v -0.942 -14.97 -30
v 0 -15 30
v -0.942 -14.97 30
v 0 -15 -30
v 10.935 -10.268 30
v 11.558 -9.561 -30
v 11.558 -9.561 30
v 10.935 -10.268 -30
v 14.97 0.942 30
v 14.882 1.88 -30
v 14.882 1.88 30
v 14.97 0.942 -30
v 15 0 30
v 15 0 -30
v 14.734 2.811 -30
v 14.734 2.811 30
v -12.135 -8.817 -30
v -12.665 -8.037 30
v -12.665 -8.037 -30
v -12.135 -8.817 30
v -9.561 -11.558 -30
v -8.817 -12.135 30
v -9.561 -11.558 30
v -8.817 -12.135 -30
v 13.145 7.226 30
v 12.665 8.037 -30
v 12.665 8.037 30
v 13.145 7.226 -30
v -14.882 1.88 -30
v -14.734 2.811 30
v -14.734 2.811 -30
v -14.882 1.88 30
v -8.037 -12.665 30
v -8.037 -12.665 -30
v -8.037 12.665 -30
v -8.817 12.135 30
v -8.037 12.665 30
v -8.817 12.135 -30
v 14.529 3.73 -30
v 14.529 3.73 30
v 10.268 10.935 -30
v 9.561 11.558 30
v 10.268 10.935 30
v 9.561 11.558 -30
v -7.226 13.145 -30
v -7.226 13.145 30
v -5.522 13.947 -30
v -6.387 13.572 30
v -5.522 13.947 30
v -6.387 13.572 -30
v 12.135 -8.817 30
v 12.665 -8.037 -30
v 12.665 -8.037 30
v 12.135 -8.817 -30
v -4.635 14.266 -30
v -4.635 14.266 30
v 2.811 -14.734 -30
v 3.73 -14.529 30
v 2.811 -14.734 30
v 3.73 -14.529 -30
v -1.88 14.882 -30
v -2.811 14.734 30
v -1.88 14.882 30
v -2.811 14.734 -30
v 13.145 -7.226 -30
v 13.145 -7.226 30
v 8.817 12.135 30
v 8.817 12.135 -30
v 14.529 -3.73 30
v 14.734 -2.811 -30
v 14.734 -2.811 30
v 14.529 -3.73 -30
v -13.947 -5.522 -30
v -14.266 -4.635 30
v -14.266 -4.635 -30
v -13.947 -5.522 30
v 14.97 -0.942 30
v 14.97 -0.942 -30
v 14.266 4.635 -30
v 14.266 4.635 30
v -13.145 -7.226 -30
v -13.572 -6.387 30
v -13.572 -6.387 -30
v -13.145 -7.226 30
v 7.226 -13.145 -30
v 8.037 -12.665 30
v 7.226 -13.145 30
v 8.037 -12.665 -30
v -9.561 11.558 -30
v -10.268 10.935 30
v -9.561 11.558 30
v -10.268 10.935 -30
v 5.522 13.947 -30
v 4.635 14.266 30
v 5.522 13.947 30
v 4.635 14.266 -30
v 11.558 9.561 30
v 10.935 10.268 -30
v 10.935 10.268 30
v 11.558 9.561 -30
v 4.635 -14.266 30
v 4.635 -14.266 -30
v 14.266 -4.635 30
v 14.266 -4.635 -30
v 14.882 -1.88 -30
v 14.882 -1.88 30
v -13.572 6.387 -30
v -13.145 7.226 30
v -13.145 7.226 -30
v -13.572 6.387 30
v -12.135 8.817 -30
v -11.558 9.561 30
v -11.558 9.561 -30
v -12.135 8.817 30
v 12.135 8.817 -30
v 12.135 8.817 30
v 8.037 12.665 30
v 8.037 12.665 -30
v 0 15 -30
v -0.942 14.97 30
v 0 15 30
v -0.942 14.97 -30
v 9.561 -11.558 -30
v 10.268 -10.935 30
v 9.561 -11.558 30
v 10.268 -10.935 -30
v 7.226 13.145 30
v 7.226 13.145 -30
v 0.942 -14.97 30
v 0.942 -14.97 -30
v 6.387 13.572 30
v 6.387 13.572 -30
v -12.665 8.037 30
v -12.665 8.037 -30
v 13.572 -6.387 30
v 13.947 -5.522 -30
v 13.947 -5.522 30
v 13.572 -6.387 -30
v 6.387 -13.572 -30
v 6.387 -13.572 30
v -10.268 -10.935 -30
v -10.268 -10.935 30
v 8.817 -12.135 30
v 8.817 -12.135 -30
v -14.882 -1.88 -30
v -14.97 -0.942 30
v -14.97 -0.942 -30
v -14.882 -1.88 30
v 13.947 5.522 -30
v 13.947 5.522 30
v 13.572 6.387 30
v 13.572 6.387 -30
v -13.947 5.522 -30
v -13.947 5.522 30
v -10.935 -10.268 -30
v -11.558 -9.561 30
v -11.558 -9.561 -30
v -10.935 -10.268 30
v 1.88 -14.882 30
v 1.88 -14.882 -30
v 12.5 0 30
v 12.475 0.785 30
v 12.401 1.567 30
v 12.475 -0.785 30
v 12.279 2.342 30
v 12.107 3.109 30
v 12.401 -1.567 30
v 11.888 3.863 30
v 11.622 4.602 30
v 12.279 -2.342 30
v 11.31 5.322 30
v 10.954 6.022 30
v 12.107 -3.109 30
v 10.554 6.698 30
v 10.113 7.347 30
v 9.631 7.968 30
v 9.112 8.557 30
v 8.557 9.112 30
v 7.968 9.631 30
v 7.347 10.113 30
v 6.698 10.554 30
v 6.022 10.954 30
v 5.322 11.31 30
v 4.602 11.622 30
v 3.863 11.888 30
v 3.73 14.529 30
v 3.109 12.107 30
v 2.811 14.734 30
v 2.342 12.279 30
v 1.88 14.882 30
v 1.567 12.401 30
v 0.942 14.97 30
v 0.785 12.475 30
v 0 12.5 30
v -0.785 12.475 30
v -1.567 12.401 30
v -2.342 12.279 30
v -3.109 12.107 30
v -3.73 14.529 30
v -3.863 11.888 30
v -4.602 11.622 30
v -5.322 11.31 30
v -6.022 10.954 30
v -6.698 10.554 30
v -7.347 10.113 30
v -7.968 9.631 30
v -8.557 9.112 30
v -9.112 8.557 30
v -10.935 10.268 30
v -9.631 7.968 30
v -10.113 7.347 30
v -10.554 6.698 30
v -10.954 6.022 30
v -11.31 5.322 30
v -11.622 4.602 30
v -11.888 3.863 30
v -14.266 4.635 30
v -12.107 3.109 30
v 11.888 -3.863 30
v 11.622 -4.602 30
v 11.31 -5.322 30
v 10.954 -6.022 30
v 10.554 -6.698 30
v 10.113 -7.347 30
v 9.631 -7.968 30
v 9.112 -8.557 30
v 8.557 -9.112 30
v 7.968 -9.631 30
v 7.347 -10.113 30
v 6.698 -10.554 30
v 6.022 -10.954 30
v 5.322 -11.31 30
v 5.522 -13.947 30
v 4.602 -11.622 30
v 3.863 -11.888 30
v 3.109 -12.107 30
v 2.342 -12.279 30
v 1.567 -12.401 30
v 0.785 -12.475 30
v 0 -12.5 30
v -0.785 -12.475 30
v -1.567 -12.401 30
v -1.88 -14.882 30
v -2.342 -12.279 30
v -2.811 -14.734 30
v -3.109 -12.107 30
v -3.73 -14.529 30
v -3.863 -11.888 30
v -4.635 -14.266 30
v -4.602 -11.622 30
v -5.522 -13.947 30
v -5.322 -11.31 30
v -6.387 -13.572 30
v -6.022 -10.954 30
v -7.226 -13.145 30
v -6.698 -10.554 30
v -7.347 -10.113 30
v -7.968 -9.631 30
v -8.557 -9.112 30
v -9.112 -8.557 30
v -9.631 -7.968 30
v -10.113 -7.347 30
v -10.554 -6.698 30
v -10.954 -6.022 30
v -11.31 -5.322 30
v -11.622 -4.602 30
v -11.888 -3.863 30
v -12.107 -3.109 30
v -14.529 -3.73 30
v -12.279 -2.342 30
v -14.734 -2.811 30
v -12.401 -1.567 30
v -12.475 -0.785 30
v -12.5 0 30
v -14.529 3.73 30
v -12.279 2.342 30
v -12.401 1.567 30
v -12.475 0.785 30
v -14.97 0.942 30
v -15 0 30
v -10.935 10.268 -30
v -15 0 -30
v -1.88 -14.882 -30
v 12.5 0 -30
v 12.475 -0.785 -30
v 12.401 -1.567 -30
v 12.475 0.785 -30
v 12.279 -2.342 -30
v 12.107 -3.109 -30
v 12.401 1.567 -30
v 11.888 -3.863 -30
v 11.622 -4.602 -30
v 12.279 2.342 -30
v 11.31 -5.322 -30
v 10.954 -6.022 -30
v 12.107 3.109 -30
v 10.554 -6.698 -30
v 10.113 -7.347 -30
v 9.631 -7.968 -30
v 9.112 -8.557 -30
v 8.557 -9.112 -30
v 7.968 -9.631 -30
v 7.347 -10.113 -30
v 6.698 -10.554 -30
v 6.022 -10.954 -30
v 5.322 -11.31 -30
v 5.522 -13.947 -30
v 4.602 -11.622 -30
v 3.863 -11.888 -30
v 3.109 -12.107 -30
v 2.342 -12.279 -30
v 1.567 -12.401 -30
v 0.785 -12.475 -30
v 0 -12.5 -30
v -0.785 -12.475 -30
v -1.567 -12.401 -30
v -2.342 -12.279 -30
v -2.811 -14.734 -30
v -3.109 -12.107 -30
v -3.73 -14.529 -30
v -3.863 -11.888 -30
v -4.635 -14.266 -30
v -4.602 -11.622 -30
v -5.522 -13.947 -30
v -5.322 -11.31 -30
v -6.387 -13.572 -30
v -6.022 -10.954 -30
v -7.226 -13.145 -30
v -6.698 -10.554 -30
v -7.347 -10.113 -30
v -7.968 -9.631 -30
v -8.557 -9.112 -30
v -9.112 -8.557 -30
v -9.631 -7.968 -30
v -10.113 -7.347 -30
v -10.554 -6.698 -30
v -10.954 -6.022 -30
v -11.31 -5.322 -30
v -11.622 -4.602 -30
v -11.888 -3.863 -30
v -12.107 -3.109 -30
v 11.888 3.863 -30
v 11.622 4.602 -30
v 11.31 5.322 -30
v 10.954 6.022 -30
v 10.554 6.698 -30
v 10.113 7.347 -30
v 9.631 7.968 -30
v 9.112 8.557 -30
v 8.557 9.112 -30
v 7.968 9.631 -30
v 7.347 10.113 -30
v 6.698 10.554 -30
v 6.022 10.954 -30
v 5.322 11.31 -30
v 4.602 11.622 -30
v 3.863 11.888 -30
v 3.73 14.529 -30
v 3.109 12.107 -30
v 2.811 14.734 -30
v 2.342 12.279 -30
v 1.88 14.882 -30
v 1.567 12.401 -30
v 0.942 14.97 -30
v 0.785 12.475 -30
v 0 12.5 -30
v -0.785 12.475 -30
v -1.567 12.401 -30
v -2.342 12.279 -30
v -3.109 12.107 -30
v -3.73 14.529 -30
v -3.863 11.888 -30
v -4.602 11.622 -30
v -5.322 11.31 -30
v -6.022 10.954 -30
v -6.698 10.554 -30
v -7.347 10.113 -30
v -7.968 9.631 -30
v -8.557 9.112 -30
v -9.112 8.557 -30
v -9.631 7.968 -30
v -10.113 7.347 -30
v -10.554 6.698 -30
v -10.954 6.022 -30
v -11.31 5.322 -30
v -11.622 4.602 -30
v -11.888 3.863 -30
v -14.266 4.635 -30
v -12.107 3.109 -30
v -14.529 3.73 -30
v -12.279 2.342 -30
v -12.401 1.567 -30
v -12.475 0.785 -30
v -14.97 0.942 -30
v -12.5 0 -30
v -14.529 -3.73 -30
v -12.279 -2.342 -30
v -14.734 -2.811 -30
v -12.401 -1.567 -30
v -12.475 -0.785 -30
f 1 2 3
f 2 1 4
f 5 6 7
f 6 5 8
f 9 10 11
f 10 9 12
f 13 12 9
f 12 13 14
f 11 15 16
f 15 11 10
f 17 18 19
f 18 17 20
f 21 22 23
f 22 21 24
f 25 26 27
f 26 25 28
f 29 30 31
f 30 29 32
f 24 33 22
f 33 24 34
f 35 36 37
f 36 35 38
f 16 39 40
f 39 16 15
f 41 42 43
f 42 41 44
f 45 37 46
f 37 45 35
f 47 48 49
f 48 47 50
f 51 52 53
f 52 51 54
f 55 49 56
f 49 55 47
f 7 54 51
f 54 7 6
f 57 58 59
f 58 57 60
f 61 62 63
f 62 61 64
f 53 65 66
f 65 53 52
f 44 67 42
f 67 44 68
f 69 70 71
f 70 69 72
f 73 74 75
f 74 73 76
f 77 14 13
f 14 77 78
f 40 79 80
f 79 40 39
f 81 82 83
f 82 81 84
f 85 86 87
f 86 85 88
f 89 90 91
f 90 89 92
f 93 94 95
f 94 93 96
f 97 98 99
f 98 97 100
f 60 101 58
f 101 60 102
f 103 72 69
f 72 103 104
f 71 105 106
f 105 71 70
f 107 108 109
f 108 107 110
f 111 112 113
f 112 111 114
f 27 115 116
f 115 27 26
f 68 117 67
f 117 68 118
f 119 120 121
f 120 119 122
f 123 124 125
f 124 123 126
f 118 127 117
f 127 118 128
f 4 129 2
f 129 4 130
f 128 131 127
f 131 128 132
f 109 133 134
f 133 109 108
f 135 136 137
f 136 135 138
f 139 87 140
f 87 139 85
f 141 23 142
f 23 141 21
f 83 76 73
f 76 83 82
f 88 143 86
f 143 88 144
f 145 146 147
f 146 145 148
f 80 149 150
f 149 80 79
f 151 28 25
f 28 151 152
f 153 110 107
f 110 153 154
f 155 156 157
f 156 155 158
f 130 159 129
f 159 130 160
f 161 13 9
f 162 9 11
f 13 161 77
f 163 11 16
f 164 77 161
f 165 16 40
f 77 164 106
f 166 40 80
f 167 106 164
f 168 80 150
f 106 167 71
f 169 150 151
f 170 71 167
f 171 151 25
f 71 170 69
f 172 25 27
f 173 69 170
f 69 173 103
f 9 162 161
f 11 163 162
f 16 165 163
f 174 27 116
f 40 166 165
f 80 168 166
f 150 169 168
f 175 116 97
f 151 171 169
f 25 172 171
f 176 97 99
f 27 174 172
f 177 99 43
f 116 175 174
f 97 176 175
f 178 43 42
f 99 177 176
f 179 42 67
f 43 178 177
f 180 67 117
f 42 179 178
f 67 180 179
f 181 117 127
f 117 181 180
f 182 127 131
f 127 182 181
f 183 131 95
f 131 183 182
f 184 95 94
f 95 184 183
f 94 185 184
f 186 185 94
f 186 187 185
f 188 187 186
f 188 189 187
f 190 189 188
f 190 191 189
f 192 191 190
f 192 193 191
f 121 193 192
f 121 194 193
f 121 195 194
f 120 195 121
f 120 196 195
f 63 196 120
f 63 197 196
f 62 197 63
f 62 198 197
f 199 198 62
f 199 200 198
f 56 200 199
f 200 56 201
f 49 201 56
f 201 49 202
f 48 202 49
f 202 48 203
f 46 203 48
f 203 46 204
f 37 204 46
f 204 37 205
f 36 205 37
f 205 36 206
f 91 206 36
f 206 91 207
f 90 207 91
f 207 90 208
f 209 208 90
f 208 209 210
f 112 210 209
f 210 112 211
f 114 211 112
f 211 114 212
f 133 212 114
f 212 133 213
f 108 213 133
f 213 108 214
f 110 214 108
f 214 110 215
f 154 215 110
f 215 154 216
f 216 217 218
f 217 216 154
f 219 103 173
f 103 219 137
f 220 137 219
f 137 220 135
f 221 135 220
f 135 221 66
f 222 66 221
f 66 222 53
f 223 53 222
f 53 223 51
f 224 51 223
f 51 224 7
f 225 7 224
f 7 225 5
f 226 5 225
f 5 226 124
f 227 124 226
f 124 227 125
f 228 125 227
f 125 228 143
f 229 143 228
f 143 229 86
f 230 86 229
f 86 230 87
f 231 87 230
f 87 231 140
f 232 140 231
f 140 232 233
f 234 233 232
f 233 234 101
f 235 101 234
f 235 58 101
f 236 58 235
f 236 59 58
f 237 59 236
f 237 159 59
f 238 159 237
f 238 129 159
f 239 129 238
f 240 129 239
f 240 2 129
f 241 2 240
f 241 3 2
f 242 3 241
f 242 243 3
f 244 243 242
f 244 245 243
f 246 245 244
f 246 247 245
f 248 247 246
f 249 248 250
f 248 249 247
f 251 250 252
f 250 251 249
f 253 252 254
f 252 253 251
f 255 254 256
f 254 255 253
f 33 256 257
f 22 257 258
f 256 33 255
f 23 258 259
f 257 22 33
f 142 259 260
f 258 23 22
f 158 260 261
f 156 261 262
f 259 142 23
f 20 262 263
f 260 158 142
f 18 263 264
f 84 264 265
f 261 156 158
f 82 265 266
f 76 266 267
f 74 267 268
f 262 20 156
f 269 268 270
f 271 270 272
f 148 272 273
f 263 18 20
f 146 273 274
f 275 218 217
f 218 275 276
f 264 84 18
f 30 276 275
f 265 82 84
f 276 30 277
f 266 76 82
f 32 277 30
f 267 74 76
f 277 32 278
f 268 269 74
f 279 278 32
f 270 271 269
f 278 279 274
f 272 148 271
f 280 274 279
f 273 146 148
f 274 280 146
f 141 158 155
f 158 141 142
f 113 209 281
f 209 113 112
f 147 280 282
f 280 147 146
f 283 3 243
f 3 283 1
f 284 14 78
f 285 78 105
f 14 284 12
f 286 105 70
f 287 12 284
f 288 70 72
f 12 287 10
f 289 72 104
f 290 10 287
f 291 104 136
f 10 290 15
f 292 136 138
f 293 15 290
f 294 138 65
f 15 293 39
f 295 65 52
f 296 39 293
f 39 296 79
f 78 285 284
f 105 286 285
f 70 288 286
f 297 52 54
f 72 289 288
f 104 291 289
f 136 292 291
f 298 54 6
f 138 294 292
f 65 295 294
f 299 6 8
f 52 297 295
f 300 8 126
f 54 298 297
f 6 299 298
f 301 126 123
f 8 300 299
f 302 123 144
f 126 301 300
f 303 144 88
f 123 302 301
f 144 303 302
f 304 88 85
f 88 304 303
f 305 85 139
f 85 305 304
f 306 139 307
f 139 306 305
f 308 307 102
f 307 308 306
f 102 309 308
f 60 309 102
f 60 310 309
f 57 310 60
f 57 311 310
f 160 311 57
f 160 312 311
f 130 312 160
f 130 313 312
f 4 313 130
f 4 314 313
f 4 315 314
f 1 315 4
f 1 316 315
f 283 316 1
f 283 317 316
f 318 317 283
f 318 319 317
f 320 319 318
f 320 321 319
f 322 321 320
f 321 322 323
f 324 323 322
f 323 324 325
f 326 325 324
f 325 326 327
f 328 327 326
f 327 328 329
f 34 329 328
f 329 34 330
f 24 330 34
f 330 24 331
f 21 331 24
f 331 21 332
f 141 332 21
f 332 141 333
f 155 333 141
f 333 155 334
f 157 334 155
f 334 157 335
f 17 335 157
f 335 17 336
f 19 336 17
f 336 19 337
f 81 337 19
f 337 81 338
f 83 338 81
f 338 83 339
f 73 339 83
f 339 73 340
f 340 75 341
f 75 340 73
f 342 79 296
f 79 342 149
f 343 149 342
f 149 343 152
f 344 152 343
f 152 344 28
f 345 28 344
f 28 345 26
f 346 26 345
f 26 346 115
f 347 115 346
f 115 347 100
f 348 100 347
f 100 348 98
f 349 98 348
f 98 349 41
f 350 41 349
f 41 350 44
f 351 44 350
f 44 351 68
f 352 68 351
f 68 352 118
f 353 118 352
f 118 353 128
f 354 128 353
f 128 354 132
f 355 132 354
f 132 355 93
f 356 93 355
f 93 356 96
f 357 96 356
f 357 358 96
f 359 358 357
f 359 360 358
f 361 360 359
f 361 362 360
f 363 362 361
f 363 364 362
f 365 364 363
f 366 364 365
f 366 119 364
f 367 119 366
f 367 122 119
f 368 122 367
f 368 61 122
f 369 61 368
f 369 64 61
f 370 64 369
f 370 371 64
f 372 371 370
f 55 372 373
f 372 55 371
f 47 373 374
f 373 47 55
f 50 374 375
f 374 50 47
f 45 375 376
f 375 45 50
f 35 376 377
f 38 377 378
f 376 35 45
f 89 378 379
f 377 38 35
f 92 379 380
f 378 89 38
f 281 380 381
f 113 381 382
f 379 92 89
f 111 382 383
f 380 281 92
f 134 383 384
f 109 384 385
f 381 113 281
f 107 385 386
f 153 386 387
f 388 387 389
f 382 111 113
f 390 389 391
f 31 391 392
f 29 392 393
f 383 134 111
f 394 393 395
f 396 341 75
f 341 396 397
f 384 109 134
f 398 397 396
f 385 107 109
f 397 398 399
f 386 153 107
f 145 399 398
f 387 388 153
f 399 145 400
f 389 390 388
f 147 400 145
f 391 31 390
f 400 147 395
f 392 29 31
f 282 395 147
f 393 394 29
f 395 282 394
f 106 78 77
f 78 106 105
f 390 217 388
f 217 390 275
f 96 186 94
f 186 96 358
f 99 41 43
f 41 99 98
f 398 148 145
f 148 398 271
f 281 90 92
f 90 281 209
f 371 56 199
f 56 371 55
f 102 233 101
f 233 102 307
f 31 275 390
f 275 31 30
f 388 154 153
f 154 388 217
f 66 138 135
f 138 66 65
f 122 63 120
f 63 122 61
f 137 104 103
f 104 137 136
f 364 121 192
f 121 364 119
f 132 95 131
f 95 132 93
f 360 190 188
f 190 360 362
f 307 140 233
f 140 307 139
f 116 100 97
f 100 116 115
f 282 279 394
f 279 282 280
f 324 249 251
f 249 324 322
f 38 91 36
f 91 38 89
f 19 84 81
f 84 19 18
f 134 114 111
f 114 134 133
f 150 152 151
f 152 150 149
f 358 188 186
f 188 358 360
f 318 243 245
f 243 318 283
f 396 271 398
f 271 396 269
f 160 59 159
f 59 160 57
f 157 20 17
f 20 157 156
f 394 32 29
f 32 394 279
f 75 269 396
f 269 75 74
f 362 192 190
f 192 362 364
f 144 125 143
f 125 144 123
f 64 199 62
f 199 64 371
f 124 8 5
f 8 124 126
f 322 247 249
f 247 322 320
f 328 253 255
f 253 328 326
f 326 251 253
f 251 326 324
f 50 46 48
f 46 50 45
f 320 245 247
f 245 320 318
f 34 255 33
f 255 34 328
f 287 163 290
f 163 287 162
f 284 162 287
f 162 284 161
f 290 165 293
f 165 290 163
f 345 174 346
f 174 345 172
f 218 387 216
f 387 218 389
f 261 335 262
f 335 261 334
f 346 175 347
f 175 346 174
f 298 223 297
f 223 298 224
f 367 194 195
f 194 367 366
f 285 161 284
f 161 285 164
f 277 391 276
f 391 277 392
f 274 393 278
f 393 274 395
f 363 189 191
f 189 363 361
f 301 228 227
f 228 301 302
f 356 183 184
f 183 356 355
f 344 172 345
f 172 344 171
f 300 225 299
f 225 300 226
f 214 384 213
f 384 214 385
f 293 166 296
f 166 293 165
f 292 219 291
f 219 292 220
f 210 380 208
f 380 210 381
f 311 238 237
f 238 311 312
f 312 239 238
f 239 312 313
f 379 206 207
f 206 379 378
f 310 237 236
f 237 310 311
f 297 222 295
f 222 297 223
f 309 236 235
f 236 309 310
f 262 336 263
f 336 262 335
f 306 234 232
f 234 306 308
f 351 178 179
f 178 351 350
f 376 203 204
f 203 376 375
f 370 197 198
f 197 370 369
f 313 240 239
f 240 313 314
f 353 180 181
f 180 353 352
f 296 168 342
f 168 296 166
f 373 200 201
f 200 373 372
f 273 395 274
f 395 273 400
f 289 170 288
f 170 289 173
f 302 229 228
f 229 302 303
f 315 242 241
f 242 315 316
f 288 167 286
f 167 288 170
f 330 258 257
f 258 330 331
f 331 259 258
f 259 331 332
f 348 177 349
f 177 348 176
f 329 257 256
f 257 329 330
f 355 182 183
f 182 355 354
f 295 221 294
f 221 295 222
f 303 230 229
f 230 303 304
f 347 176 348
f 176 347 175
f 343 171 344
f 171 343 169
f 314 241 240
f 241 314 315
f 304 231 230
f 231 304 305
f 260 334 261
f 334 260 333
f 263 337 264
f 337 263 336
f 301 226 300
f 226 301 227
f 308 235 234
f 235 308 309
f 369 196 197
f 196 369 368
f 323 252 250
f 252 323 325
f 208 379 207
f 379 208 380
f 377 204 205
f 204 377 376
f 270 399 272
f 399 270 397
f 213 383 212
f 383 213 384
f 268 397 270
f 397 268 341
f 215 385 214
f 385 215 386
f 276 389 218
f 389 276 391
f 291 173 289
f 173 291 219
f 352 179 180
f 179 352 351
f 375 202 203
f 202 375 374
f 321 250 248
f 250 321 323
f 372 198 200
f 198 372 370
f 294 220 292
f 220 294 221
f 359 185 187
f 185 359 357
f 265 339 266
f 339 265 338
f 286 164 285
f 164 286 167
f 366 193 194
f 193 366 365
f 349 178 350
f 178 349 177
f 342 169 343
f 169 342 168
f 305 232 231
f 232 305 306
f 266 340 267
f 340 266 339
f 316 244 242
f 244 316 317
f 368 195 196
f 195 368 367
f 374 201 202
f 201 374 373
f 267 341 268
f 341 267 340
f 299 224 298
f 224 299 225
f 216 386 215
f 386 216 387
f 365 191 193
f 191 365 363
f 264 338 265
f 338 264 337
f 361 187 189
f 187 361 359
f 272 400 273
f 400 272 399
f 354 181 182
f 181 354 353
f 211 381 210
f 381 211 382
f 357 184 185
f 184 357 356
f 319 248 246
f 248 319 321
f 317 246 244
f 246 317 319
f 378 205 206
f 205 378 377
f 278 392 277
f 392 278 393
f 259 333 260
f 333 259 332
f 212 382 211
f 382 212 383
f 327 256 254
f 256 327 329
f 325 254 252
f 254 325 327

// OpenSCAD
// Generated by SolidPython 0.4.6 on 2020-01-18 01:45:20
$fn = 100;


difference() {
	cylinder(center = true, d = 30, h = 60);
	cylinder(center = true, d = 25, h = 60);
}
/***********************************************
*********      SolidPython code:      **********
************************************************
 
# Generic Part Class

# Import SolidPython
from solid import *

# This class acts more as a specification and generator for the geometry than as a representation of the actual objects.
# Each part needs to be self-contained and run without information from the other parts (directly)
# This will allow more flexibility in design as we can change each part individually without affecting the others
class RSGL_Part:
    
    # Needs to be overrided by other classes to be used
    # Create a new instance of this object and return it to the user
    def generate_geometry(self):
        print('Generating Part Geometry')
        return None
    
    def render_to_file(self, path, fn):
        
        if not path.endswith('.scad'):
            raise ValueError('File is not an OpenSCAD file')
            return None
        
        g = self.generate_geometry()
        print('Rendering to %s' % path)
        
        try:
            scad_render_to_file(g, filepath = path, file_header=f'$fn = {fn};')
        except Exception as e:
            print(e)
            return None
        
        return g
    
    def render_to_stl(self, path, fn):
        self.render_to_file(path + 'scad')
        raise NotImplementedError('Rendering to STL file has not been implemented yet.')
        print('Rendering to %s' % path)
 
 
************************************************/
